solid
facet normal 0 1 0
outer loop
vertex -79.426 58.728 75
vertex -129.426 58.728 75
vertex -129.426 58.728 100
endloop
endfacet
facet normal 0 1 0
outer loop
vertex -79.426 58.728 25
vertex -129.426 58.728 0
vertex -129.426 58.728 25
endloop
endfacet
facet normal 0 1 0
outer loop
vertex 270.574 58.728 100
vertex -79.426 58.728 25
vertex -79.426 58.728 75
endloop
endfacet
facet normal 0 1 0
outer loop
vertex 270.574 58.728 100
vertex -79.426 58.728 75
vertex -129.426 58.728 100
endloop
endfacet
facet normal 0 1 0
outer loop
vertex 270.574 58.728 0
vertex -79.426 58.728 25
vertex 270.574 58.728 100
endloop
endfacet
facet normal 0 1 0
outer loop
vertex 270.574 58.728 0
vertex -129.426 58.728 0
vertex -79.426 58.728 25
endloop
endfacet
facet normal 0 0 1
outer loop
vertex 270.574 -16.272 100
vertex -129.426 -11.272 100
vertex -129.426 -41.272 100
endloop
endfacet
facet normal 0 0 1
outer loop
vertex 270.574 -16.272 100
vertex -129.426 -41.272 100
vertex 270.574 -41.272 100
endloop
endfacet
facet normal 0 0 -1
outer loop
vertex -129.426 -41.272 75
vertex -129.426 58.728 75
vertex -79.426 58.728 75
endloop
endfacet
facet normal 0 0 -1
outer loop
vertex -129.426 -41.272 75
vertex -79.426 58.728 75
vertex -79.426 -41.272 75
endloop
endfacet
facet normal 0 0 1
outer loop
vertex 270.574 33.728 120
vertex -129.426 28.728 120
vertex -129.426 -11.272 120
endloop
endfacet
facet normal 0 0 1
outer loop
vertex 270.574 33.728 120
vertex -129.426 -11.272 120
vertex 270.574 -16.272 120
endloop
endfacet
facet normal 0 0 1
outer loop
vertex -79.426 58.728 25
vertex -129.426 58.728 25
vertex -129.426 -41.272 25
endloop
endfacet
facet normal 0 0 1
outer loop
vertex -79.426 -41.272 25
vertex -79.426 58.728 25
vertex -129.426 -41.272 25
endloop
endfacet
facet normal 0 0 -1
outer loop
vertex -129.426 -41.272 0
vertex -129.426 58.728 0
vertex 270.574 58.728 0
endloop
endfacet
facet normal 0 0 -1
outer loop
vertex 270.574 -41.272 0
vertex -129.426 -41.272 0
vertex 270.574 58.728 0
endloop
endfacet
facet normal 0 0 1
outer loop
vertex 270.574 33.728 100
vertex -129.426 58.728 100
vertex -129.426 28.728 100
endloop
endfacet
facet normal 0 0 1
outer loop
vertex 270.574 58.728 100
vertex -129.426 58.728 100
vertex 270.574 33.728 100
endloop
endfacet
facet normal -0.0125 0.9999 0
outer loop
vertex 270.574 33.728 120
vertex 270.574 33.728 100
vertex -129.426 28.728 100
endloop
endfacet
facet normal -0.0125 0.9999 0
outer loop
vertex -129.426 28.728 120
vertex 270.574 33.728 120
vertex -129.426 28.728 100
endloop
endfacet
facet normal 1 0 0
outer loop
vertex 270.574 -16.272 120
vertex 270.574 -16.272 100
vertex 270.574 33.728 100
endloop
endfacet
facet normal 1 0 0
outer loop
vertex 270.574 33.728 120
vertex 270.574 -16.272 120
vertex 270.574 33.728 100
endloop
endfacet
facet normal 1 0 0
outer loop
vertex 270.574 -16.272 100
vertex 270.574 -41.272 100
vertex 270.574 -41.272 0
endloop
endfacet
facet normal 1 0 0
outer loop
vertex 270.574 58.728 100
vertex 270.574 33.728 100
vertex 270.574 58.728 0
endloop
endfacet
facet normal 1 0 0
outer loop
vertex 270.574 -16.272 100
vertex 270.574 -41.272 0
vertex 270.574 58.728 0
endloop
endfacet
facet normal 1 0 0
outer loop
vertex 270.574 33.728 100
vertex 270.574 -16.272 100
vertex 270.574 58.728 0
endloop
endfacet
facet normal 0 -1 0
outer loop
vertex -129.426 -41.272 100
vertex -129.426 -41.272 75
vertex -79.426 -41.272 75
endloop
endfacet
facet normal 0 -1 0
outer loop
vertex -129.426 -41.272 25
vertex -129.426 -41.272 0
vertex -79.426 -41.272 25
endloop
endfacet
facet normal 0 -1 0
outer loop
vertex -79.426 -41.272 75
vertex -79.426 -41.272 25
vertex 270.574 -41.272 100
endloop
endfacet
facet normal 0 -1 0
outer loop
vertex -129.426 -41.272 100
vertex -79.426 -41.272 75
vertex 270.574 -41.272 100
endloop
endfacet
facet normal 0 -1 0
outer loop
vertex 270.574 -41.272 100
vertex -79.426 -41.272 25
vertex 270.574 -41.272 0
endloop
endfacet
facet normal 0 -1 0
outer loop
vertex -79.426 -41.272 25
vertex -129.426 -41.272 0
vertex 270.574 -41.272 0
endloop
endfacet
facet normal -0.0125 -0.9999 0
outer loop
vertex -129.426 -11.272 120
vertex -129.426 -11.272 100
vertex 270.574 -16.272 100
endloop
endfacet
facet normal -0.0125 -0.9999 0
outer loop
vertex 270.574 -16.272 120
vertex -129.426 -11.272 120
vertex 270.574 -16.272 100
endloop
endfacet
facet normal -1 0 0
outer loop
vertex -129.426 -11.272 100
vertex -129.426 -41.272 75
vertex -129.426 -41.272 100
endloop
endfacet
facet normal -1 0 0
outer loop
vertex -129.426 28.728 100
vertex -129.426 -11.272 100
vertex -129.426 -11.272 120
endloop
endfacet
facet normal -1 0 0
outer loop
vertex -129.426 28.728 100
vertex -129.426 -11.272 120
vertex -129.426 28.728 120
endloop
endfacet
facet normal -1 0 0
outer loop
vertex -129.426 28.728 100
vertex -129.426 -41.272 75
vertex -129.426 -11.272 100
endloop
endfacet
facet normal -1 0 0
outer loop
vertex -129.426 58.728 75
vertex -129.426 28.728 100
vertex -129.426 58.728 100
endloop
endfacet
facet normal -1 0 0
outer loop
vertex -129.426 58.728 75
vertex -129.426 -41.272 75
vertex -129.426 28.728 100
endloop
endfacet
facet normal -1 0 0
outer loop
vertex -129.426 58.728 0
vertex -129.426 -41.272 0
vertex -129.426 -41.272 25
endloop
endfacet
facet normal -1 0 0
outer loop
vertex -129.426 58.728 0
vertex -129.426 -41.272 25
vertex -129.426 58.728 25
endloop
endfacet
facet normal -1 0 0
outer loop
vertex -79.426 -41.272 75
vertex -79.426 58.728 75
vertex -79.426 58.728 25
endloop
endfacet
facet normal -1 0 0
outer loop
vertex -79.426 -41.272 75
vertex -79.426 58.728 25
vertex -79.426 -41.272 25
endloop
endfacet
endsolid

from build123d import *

# Parameters (mm, degrees)
F0_W     = 400
F0_H     = 100
F1_DEPTH = 100
F3_DEPTH = 20
F4_W     = 100
F4_H     = 50
F5_DEPTH = 50


with BuildPart() as f1:
    # F0 (on Top) → F1 (new body)
    with BuildSketch(Plane.XY):
        with Locations((70.573999, 8.728447)):
            Rectangle(F0_W, F0_H)
    extrude(amount=F1_DEPTH)

    # F2 (on face) → F3 (join)
    with BuildSketch(Plane.XY.offset(100)):
        Polygon((270.573999, -16.271553), (270.573999, 33.728447), (-129.426001, 28.728447), (-129.426001, -11.271553), align=None)
    extrude(amount=F3_DEPTH)

    # F4 (on face) → F5 (cut)
    with BuildSketch(Plane(origin=(-129.426001, 0, 0), x_dir=(0, -1, 0), z_dir=(-1, 0, 0))):
        with Locations((-8.728447, 50)):
            Rectangle(F4_W, F4_H)
    extrude(amount=-F5_DEPTH, mode=Mode.SUBTRACT)


solid = f1.part
